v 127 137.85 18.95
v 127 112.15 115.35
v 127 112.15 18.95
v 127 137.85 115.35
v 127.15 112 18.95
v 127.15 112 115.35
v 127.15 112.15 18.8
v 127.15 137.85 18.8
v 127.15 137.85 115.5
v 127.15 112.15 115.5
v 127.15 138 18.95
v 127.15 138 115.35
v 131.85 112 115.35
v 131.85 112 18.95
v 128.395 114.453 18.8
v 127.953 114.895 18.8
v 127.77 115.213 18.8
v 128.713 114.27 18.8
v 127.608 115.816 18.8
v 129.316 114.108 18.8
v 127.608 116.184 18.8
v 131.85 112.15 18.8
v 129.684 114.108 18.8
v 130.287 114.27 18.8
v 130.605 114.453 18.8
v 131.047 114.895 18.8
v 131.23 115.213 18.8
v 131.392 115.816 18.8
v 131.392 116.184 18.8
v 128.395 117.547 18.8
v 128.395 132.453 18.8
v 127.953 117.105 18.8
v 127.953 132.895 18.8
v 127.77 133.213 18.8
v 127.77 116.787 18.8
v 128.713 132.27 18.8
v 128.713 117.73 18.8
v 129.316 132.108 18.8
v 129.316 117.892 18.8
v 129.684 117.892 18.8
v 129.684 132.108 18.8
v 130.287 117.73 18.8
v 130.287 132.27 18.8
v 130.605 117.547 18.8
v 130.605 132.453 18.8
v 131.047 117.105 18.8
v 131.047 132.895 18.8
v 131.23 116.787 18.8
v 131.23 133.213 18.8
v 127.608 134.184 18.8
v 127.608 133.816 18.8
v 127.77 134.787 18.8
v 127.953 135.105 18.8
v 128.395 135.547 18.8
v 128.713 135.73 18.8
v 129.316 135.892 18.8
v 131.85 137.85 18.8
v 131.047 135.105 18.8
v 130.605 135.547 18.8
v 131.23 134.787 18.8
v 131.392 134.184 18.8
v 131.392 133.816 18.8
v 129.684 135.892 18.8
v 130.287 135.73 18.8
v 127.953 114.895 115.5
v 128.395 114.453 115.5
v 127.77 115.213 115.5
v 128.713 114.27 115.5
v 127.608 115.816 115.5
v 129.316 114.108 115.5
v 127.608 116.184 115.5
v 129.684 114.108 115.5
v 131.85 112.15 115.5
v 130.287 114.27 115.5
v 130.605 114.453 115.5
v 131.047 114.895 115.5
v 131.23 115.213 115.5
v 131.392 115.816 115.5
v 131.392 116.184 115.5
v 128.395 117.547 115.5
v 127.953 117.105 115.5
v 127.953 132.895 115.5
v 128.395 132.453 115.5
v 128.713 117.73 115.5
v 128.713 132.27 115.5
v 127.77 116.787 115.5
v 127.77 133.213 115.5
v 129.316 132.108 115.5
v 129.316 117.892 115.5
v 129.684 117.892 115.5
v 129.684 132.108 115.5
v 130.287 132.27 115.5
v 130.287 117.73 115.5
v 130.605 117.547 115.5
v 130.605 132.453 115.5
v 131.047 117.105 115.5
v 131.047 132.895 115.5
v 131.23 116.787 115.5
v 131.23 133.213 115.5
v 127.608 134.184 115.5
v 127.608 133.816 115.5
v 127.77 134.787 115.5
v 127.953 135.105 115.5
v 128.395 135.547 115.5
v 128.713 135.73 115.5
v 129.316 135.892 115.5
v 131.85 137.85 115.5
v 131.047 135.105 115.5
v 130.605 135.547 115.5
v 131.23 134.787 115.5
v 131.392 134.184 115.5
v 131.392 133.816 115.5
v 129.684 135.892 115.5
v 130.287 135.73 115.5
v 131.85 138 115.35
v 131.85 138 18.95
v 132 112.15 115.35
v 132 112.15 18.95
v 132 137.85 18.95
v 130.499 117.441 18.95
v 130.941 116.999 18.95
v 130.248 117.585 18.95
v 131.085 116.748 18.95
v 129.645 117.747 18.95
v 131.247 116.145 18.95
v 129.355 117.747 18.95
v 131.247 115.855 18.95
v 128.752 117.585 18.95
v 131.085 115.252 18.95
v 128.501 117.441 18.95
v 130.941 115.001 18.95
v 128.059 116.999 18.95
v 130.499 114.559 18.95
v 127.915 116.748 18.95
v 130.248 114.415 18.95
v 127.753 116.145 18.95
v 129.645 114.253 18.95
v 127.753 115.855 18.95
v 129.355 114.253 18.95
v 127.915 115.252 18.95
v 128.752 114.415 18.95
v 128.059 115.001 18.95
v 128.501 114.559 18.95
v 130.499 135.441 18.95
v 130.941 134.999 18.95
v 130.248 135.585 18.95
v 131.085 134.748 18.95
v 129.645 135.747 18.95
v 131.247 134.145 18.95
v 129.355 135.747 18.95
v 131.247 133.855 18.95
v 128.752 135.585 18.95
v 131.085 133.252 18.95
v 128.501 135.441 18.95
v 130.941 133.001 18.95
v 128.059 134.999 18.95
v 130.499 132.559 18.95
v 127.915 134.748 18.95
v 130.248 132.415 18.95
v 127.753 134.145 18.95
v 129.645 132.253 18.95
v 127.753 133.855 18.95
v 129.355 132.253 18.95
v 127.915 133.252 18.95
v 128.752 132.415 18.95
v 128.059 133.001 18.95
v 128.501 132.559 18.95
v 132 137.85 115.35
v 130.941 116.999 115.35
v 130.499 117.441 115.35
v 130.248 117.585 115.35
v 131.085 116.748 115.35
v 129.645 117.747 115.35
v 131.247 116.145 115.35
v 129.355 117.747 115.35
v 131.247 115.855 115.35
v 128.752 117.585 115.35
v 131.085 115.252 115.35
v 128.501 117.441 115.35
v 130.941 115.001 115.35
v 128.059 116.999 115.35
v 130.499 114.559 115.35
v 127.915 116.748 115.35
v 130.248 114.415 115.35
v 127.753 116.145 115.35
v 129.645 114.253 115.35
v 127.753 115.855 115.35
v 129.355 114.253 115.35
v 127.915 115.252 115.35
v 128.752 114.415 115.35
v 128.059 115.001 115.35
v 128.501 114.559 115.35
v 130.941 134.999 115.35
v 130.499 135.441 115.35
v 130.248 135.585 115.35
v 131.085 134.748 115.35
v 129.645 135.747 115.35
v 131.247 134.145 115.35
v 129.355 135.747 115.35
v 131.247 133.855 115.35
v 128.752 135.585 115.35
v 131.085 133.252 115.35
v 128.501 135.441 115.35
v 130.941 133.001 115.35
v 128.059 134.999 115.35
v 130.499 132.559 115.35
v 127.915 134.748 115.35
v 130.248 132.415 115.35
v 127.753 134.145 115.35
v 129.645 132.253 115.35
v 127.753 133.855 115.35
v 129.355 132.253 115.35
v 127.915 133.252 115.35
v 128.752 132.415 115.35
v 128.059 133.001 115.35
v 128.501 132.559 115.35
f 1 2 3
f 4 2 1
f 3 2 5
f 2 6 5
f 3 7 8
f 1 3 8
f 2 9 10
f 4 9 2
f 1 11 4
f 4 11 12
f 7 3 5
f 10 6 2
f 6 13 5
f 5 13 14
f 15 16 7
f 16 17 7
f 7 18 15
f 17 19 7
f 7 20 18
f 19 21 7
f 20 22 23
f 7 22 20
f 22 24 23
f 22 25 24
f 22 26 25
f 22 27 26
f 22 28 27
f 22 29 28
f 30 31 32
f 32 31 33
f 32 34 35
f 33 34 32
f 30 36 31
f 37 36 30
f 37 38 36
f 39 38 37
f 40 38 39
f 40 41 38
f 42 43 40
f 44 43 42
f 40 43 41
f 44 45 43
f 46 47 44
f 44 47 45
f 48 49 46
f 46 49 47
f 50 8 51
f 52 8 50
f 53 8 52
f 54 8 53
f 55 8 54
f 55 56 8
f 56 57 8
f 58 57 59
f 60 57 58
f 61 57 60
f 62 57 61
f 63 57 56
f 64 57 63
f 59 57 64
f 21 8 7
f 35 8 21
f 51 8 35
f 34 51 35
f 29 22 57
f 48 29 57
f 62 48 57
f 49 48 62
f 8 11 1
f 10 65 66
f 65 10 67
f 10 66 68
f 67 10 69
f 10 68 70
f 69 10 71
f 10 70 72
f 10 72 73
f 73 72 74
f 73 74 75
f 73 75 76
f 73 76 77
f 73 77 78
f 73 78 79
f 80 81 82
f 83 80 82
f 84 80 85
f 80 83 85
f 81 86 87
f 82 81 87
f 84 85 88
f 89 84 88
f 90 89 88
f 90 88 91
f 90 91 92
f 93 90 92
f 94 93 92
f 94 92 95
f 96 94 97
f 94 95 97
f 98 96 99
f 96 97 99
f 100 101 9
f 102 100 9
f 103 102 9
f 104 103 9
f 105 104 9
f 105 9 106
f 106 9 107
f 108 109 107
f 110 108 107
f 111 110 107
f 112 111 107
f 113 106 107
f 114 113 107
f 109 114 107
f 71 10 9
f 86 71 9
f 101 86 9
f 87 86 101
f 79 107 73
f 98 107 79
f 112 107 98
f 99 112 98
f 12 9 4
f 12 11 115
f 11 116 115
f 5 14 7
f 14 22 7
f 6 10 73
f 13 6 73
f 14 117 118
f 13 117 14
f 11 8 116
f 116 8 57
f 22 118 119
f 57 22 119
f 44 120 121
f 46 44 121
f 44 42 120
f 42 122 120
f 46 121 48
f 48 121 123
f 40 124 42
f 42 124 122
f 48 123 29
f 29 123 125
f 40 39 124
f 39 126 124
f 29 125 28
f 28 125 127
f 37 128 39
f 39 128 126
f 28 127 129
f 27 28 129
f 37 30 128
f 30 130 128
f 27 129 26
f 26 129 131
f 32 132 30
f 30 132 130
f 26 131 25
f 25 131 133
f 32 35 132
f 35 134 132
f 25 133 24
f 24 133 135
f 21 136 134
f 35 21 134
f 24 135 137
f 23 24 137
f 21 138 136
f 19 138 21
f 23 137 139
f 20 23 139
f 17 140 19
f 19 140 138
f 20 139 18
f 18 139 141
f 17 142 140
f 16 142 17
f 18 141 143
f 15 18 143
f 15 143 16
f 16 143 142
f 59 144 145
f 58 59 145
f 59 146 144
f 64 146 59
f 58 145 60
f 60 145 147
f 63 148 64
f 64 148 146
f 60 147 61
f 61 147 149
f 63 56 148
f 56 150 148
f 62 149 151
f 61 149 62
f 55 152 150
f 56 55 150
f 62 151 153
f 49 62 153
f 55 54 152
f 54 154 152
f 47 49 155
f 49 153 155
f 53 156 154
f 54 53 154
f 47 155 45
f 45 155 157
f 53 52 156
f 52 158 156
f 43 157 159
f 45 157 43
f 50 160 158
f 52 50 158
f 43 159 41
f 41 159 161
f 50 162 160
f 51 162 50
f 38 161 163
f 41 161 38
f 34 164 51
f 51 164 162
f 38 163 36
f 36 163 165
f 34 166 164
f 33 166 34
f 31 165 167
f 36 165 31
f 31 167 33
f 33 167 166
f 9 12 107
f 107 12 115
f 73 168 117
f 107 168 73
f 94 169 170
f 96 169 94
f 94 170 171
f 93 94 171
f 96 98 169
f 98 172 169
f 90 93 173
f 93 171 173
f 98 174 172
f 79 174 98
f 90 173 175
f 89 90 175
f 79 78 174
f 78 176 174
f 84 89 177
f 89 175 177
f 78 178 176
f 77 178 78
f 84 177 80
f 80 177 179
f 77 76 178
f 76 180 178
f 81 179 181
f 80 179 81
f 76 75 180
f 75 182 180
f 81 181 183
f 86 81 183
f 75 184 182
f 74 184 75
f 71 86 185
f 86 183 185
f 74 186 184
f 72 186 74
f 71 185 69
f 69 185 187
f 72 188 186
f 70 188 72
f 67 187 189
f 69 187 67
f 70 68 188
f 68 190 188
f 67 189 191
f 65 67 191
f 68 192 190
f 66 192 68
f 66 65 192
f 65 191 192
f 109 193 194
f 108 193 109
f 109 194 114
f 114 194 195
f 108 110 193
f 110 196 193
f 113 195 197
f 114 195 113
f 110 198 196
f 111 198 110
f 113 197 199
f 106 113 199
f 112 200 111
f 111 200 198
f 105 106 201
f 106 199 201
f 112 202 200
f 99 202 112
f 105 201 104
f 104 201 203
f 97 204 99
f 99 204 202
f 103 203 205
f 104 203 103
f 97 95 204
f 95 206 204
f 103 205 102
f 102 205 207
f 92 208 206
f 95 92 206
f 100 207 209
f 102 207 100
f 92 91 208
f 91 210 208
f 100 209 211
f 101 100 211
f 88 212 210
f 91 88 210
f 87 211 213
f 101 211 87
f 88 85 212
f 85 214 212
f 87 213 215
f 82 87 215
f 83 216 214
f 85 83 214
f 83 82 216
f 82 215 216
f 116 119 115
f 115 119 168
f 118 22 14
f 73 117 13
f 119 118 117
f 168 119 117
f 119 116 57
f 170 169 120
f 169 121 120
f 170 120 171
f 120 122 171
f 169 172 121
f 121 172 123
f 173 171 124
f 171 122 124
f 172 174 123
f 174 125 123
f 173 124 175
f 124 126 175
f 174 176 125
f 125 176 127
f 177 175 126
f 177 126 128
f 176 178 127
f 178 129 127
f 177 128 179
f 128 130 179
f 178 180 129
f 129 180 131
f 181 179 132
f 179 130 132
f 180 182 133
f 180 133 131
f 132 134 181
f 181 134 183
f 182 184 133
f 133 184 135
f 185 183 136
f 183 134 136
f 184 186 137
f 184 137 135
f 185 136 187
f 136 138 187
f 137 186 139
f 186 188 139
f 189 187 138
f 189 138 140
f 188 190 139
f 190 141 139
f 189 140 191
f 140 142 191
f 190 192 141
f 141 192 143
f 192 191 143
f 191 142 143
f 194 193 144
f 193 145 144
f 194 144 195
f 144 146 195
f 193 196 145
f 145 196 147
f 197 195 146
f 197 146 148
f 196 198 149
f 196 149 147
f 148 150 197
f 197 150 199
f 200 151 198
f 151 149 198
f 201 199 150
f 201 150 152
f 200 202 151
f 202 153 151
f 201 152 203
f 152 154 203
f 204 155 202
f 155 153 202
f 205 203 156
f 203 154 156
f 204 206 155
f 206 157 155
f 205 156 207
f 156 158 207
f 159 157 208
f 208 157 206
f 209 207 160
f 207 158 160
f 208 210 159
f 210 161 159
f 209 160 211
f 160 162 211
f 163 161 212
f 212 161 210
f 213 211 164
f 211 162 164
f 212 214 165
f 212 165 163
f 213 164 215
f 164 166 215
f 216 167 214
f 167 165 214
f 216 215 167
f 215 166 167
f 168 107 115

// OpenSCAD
// Generated from the same CSG operations as STEP. Rebuild with spec/build_parent_hand_service.py.
polyhedron(points=[[127.0, 112.1500015258789, 18.950000762939453], [127.0, 112.1500015258789, 115.3499984741211], [127.0, 137.85000610351562, 18.950000762939453], [127.0, 137.85000610351562, 115.3499984741211], [127.1500015258789, 112.0, 18.950000762939453], [127.1500015258789, 112.0, 115.3499984741211], [127.1500015258789, 137.85000610351562, 18.799999237060547], [127.1500015258789, 112.1500015258789, 18.799999237060547], [127.1500015258789, 112.1500015258789, 115.5], [127.1500015258789, 137.85000610351562, 115.5], [127.1500015258789, 138.0, 18.950000762939453], [127.1500015258789, 138.0, 115.3499984741211], [131.85000610351562, 112.0, 115.3499984741211], [131.85000610351562, 112.0, 18.950000762939453], [127.95340728759766, 114.89494323730469, 18.799999237060547], [128.3949432373047, 114.45340728759766, 18.799999237060547], [127.76969909667969, 115.21314239501953, 18.799999237060547], [128.713134765625, 114.26969909667969, 18.799999237060547], [127.60808563232422, 115.81629180908203, 18.799999237060547], [129.3162841796875, 114.10808563232422, 18.799999237060547], [127.60808563232422, 116.18370819091797, 18.799999237060547], [129.6837158203125, 114.10808563232422, 18.799999237060547], [131.85000610351562, 112.1500015258789, 18.799999237060547], [130.286865234375, 114.26969909667969, 18.799999237060547], [130.6050567626953, 114.45340728759766, 18.799999237060547], [131.0465850830078, 114.89494323730469, 18.799999237060547], [131.2303009033203, 115.21314239501953, 18.799999237060547], [131.3919219970703, 115.81629180908203, 18.799999237060547], [131.3919219970703, 116.18370819091797, 18.799999237060547], [127.95340728759766, 117.10505676269531, 18.799999237060547], [128.3949432373047, 132.4534149169922, 18.799999237060547], [128.3949432373047, 117.54659271240234, 18.799999237060547], [127.95340728759766, 132.8949432373047, 18.799999237060547], [127.76969909667969, 116.78685760498047, 18.799999237060547], [127.76969909667969, 133.213134765625, 18.799999237060547], [128.713134765625, 132.2696990966797, 18.799999237060547], [128.713134765625, 117.73030090332031, 18.799999237060547], [129.3162841796875, 132.1080780029297, 18.799999237060547], [129.3162841796875, 117.89191436767578, 18.799999237060547], [129.6837158203125, 117.89191436767578, 18.799999237060547], [129.6837158203125, 132.1080780029297, 18.799999237060547], [130.286865234375, 132.2696990966797, 18.799999237060547], [130.286865234375, 117.73030090332031, 18.799999237060547], [130.6050567626953, 117.54659271240234, 18.799999237060547], [130.6050567626953, 132.4534149169922, 18.799999237060547], [131.0465850830078, 132.8949432373047, 18.799999237060547], [131.0465850830078, 117.10505676269531, 18.799999237060547], [131.2303009033203, 133.213134765625, 18.799999237060547], [131.2303009033203, 116.78685760498047, 18.799999237060547], [127.60808563232422, 133.8162841796875, 18.799999237060547], [127.60808563232422, 134.1837158203125, 18.799999237060547], [127.76969909667969, 134.786865234375, 18.799999237060547], [127.95340728759766, 135.1050567626953, 18.799999237060547], [128.3949432373047, 135.5465850830078, 18.799999237060547], [128.713134765625, 135.7303009033203, 18.799999237060547], [129.3162841796875, 135.8919219970703, 18.799999237060547], [131.85000610351562, 137.85000610351562, 18.799999237060547], [130.6050567626953, 135.5465850830078, 18.799999237060547], [131.0465850830078, 135.1050567626953, 18.799999237060547], [131.2303009033203, 134.786865234375, 18.799999237060547], [131.3919219970703, 134.1837158203125, 18.799999237060547], [131.3919219970703, 133.8162841796875, 18.799999237060547], [129.6837158203125, 135.8919219970703, 18.799999237060547], [130.286865234375, 135.7303009033203, 18.799999237060547], [128.3949432373047, 114.45340728759766, 115.5], [127.95340728759766, 114.89494323730469, 115.5], [127.76969909667969, 115.21314239501953, 115.5], [128.713134765625, 114.26969909667969, 115.5], [127.60808563232422, 115.81629180908203, 115.5], [129.3162841796875, 114.10808563232422, 115.5], [127.60808563232422, 116.18370819091797, 115.5], [129.6837158203125, 114.10808563232422, 115.5], [131.85000610351562, 112.1500015258789, 115.5], [130.286865234375, 114.26969909667969, 115.5], [130.6050567626953, 114.45340728759766, 115.5], [131.0465850830078, 114.89494323730469, 115.5], [131.2303009033203, 115.21314239501953, 115.5], [131.3919219970703, 115.81629180908203, 115.5], [131.3919219970703, 116.18370819091797, 115.5], [127.95340728759766, 132.8949432373047, 115.5], [127.95340728759766, 117.10505676269531, 115.5], [128.3949432373047, 117.54659271240234, 115.5], [128.3949432373047, 132.4534149169922, 115.5], [128.713134765625, 132.2696990966797, 115.5], [128.713134765625, 117.73030090332031, 115.5], [127.76969909667969, 133.213134765625, 115.5], [127.76969909667969, 116.78685760498047, 115.5], [129.3162841796875, 132.1080780029297, 115.5], [129.3162841796875, 117.89191436767578, 115.5], [129.6837158203125, 117.89191436767578, 115.5], [129.6837158203125, 132.1080780029297, 115.5], [130.286865234375, 132.2696990966797, 115.5], [130.286865234375, 117.73030090332031, 115.5], [130.6050567626953, 117.54659271240234, 115.5], [130.6050567626953, 132.4534149169922, 115.5], [131.0465850830078, 132.8949432373047, 115.5], [131.0465850830078, 117.10505676269531, 115.5], [131.2303009033203, 133.213134765625, 115.5], [131.2303009033203, 116.78685760498047, 115.5], [127.60808563232422, 133.8162841796875, 115.5], [127.60808563232422, 134.1837158203125, 115.5], [127.76969909667969, 134.786865234375, 115.5], [127.95340728759766, 135.1050567626953, 115.5], [128.3949432373047, 135.5465850830078, 115.5], [128.713134765625, 135.7303009033203, 115.5], [129.3162841796875, 135.8919219970703, 115.5], [131.85000610351562, 137.85000610351562, 115.5], [130.6050567626953, 135.5465850830078, 115.5], [131.0465850830078, 135.1050567626953, 115.5], [131.2303009033203, 134.786865234375, 115.5], [131.3919219970703, 134.1837158203125, 115.5], [131.3919219970703, 133.8162841796875, 115.5], [129.6837158203125, 135.8919219970703, 115.5], [130.286865234375, 135.7303009033203, 115.5], [131.85000610351562, 138.0, 115.3499984741211], [131.85000610351562, 138.0, 18.950000762939453], [132.0, 112.1500015258789, 18.950000762939453], [132.0, 112.1500015258789, 115.3499984741211], [132.0, 137.85000610351562, 18.950000762939453], [130.94052124023438, 116.99899291992188, 18.950000762939453], [130.49899291992188, 117.4405288696289, 18.950000762939453], [130.24803161621094, 117.58541870117188, 18.950000762939453], [131.08541870117188, 116.74803924560547, 18.950000762939453], [129.64488220214844, 117.74703216552734, 18.950000762939453], [131.2470245361328, 116.14488983154297, 18.950000762939453], [129.35511779785156, 117.74703216552734, 18.950000762939453], [131.2470245361328, 115.85511016845703, 18.950000762939453], [128.75196838378906, 117.58541870117188, 18.950000762939453], [131.08541870117188, 115.25196075439453, 18.950000762939453], [128.50100708007812, 117.4405288696289, 18.950000762939453], [130.94052124023438, 115.00100708007812, 18.950000762939453], [128.05947875976562, 116.99899291992188, 18.950000762939453], [130.49899291992188, 114.5594711303711, 18.950000762939453], [127.91458129882812, 116.74803924560547, 18.950000762939453], [130.24803161621094, 114.41458129882812, 18.950000762939453], [127.75296783447266, 116.14488983154297, 18.950000762939453], [129.64488220214844, 114.25296783447266, 18.950000762939453], [127.75296783447266, 115.85511016845703, 18.950000762939453], [129.35511779785156, 114.25296783447266, 18.950000762939453], [127.91458129882812, 115.25196075439453, 18.950000762939453], [128.75196838378906, 114.41458129882812, 18.950000762939453], [128.05947875976562, 115.00100708007812, 18.950000762939453], [128.50100708007812, 114.5594711303711, 18.950000762939453], [130.94052124023438, 134.99899291992188, 18.950000762939453], [130.49899291992188, 135.44052124023438, 18.950000762939453], [130.24803161621094, 135.58541870117188, 18.950000762939453], [131.08541870117188, 134.74803161621094, 18.950000762939453], [129.64488220214844, 135.7470245361328, 18.950000762939453], [131.2470245361328, 134.14488220214844, 18.950000762939453], [129.35511779785156, 135.7470245361328, 18.950000762939453], [131.2470245361328, 133.85511779785156, 18.950000762939453], [128.75196838378906, 135.58541870117188, 18.950000762939453], [131.08541870117188, 133.25196838378906, 18.950000762939453], [128.50100708007812, 135.44052124023438, 18.950000762939453], [130.94052124023438, 133.00100708007812, 18.950000762939453], [128.05947875976562, 134.99899291992188, 18.950000762939453], [130.49899291992188, 132.55947875976562, 18.950000762939453], [127.91458129882812, 134.74803161621094, 18.950000762939453], [130.24803161621094, 132.41458129882812, 18.950000762939453], [127.75296783447266, 134.14488220214844, 18.950000762939453], [129.64488220214844, 132.2529754638672, 18.950000762939453], [127.75296783447266, 133.85511779785156, 18.950000762939453], [129.35511779785156, 132.2529754638672, 18.950000762939453], [127.91458129882812, 133.25196838378906, 18.950000762939453], [128.75196838378906, 132.41458129882812, 18.950000762939453], [128.05947875976562, 133.00100708007812, 18.950000762939453], [128.50100708007812, 132.55947875976562, 18.950000762939453], [132.0, 137.85000610351562, 115.3499984741211], [130.49899291992188, 117.4405288696289, 115.3499984741211], [130.94052124023438, 116.99899291992188, 115.3499984741211], [130.24803161621094, 117.58541870117188, 115.3499984741211], [131.08541870117188, 116.74803924560547, 115.3499984741211], [129.64488220214844, 117.74703216552734, 115.3499984741211], [131.2470245361328, 116.14488983154297, 115.3499984741211], [129.35511779785156, 117.74703216552734, 115.3499984741211], [131.2470245361328, 115.85511016845703, 115.3499984741211], [128.75196838378906, 117.58541870117188, 115.3499984741211], [131.08541870117188, 115.25196075439453, 115.3499984741211], [128.50100708007812, 117.4405288696289, 115.3499984741211], [130.94052124023438, 115.00100708007812, 115.3499984741211], [128.05947875976562, 116.99899291992188, 115.3499984741211], [130.49899291992188, 114.5594711303711, 115.3499984741211], [127.91458129882812, 116.74803924560547, 115.3499984741211], [130.24803161621094, 114.41458129882812, 115.3499984741211], [127.75296783447266, 116.14488983154297, 115.3499984741211], [129.64488220214844, 114.25296783447266, 115.3499984741211], [127.75296783447266, 115.85511016845703, 115.3499984741211], [129.35511779785156, 114.25296783447266, 115.3499984741211], [127.91458129882812, 115.25196075439453, 115.3499984741211], [128.75196838378906, 114.41458129882812, 115.3499984741211], [128.05947875976562, 115.00100708007812, 115.3499984741211], [128.50100708007812, 114.5594711303711, 115.3499984741211], [130.49899291992188, 135.44052124023438, 115.3499984741211], [130.94052124023438, 134.99899291992188, 115.3499984741211], [130.24803161621094, 135.58541870117188, 115.3499984741211], [131.08541870117188, 134.74803161621094, 115.3499984741211], [129.64488220214844, 135.7470245361328, 115.3499984741211], [131.2470245361328, 134.14488220214844, 115.3499984741211], [129.35511779785156, 135.7470245361328, 115.3499984741211], [131.2470245361328, 133.85511779785156, 115.3499984741211], [128.75196838378906, 135.58541870117188, 115.3499984741211], [131.08541870117188, 133.25196838378906, 115.3499984741211], [128.50100708007812, 135.44052124023438, 115.3499984741211], [130.94052124023438, 133.00100708007812, 115.3499984741211], [128.05947875976562, 134.99899291992188, 115.3499984741211], [130.49899291992188, 132.55947875976562, 115.3499984741211], [127.91458129882812, 134.74803161621094, 115.3499984741211], [130.24803161621094, 132.41458129882812, 115.3499984741211], [127.75296783447266, 134.14488220214844, 115.3499984741211], [129.64488220214844, 132.2529754638672, 115.3499984741211], [127.75296783447266, 133.85511779785156, 115.3499984741211], [129.35511779785156, 132.2529754638672, 115.3499984741211], [127.91458129882812, 133.25196838378906, 115.3499984741211], [128.75196838378906, 132.41458129882812, 115.3499984741211], [128.05947875976562, 133.00100708007812, 115.3499984741211], [128.50100708007812, 132.55947875976562, 115.3499984741211]],faces=[[0, 1, 2], [2, 1, 3], [4, 1, 0], [4, 5, 1], [6, 7, 0], [6, 0, 2], [8, 9, 1], [1, 9, 3], [3, 10, 2], [11, 10, 3], [4, 0, 7], [1, 5, 8], [4, 12, 5], [13, 12, 4], [7, 14, 15], [7, 16, 14], [15, 17, 7], [7, 18, 16], [17, 19, 7], [7, 20, 18], [21, 22, 19], [19, 22, 7], [21, 23, 22], [23, 24, 22], [24, 25, 22], [25, 26, 22], [26, 27, 22], [27, 28, 22], [29, 30, 31], [32, 30, 29], [33, 34, 29], [29, 34, 32], [30, 35, 31], [31, 35, 36], [35, 37, 36], [36, 37, 38], [38, 37, 39], [37, 40, 39], [39, 41, 42], [42, 41, 43], [40, 41, 39], [41, 44, 43], [43, 45, 46], [44, 45, 43], [46, 47, 48], [45, 47, 46], [49, 6, 50], [50, 6, 51], [51, 6, 52], [52, 6, 53], [53, 6, 54], [6, 55, 54], [6, 56, 55], [57, 56, 58], [58, 56, 59], [59, 56, 60], [60, 56, 61], [55, 56, 62], [62, 56, 63], [63, 56, 57], [7, 6, 20], [20, 6, 33], [33, 6, 49], [33, 49, 34], [56, 22, 28], [56, 28, 48], [56, 48, 61], [61, 48, 47], [2, 10, 6], [64, 65, 8], [66, 8, 65], [67, 64, 8], [68, 8, 66], [69, 67, 8], [70, 8, 68], [71, 69, 8], [72, 71, 8], [73, 71, 72], [74, 73, 72], [75, 74, 72], [76, 75, 72], [77, 76, 72], [78, 77, 72], [79, 80, 81], [79, 81, 82], [83, 81, 84], [83, 82, 81], [85, 86, 80], [85, 80, 79], [87, 83, 84], [87, 84, 88], [87, 88, 89], [90, 87, 89], [91, 90, 89], [91, 89, 92], [91, 92, 93], [94, 91, 93], [95, 93, 96], [95, 94, 93], [97, 96, 98], [97, 95, 96], [9, 99, 100], [9, 100, 101], [9, 101, 102], [9, 102, 103], [9, 103, 104], [105, 9, 104], [106, 9, 105], [106, 107, 108], [106, 108, 109], [106, 109, 110], [106, 110, 111], [106, 105, 112], [106, 112, 113], [106, 113, 107], [9, 8, 70], [9, 70, 86], [9, 86, 99], [99, 86, 85], [72, 106, 78], [78, 106, 98], [98, 106, 111], [98, 111, 97], [3, 9, 11], [114, 10, 11], [114, 115, 10], [7, 13, 4], [7, 22, 13], [72, 8, 5], [72, 5, 12], [116, 117, 13], [13, 117, 12], [115, 6, 10], [56, 6, 115], [118, 116, 22], [118, 22, 56], [119, 120, 43], [119, 43, 46], [120, 42, 43], [120, 121, 42], [48, 119, 46], [122, 119, 48], [42, 123, 39], [121, 123, 42], [28, 122, 48], [124, 122, 28], [123, 38, 39], [123, 125, 38], [27, 124, 28], [126, 124, 27], [38, 127, 36], [125, 127, 38], [128, 126, 27], [128, 27, 26], [127, 31, 36], [127, 129, 31], [25, 128, 26], [130, 128, 25], [31, 131, 29], [129, 131, 31], [24, 130, 25], [132, 130, 24], [131, 33, 29], [131, 133, 33], [23, 132, 24], [134, 132, 23], [133, 135, 20], [133, 20, 33], [136, 134, 23], [136, 23, 21], [135, 137, 20], [20, 137, 18], [138, 136, 21], [138, 21, 19], [18, 139, 16], [137, 139, 18], [17, 138, 19], [140, 138, 17], [139, 141, 16], [16, 141, 14], [142, 140, 17], [142, 17, 15], [14, 142, 15], [141, 142, 14], [143, 144, 57], [143, 57, 58], [144, 145, 57], [57, 145, 63], [59, 143, 58], [146, 143, 59], [63, 147, 62], [145, 147, 63], [60, 146, 59], [148, 146, 60], [147, 55, 62], [147, 149, 55], [150, 148, 61], [61, 148, 60], [149, 151, 54], [149, 54, 55], [152, 150, 61], [152, 61, 47], [151, 53, 54], [151, 153, 53], [154, 47, 45], [154, 152, 47], [153, 155, 52], [153, 52, 53], [44, 154, 45], [156, 154, 44], [155, 51, 52], [155, 157, 51], [158, 156, 41], [41, 156, 44], [157, 159, 50], [157, 50, 51], [40, 158, 41], [160, 158, 40], [159, 161, 50], [50, 161, 49], [162, 160, 37], [37, 160, 40], [49, 163, 34], [161, 163, 49], [35, 162, 37], [164, 162, 35], [163, 165, 34], [34, 165, 32], [166, 164, 30], [30, 164, 35], [32, 166, 30], [165, 166, 32], [106, 11, 9], [114, 11, 106], [117, 167, 72], [72, 167, 106], [168, 169, 93], [93, 169, 96], [170, 168, 93], [170, 93, 92], [169, 98, 96], [169, 171, 98], [172, 92, 89], [172, 170, 92], [171, 173, 98], [98, 173, 78], [174, 172, 89], [174, 89, 88], [173, 77, 78], [173, 175, 77], [176, 88, 84], [176, 174, 88], [175, 177, 77], [77, 177, 76], [81, 176, 84], [178, 176, 81], [177, 75, 76], [177, 179, 75], [180, 178, 80], [80, 178, 81], [179, 74, 75], [179, 181, 74], [182, 180, 80], [182, 80, 86], [181, 183, 74], [74, 183, 73], [184, 86, 70], [184, 182, 86], [183, 185, 73], [73, 185, 71], [68, 184, 70], [186, 184, 68], [185, 187, 71], [71, 187, 69], [188, 186, 66], [66, 186, 68], [187, 67, 69], [187, 189, 67], [190, 188, 66], [190, 66, 65], [189, 191, 67], [67, 191, 64], [191, 65, 64], [191, 190, 65], [192, 193, 107], [107, 193, 108], [113, 192, 107], [194, 192, 113], [193, 109, 108], [193, 195, 109], [196, 194, 112], [112, 194, 113], [195, 197, 109], [109, 197, 110], [198, 196, 112], [198, 112, 105], [110, 199, 111], [197, 199, 110], [200, 105, 104], [200, 198, 105], [199, 201, 111], [111, 201, 97], [103, 200, 104], [202, 200, 103], [97, 203, 95], [201, 203, 97], [204, 202, 102], [102, 202, 103], [203, 94, 95], [203, 205, 94], [101, 204, 102], [206, 204, 101], [205, 207, 91], [205, 91, 94], [208, 206, 100], [100, 206, 101], [207, 90, 91], [207, 209, 90], [210, 208, 100], [210, 100, 99], [209, 211, 87], [209, 87, 90], [212, 210, 85], [85, 210, 99], [211, 83, 87], [211, 213, 83], [214, 212, 85], [214, 85, 79], [213, 215, 82], [213, 82, 83], [215, 79, 82], [215, 214, 79], [114, 118, 115], [167, 118, 114], [13, 22, 116], [12, 117, 72], [117, 116, 118], [117, 118, 167], [56, 115, 118], [120, 169, 168], [120, 119, 169], [170, 120, 168], [170, 121, 120], [119, 171, 169], [122, 171, 119], [123, 170, 172], [123, 121, 170], [122, 173, 171], [122, 124, 173], [174, 123, 172], [174, 125, 123], [124, 175, 173], [126, 175, 124], [125, 174, 176], [127, 125, 176], [126, 177, 175], [126, 128, 177], [178, 127, 176], [178, 129, 127], [128, 179, 177], [130, 179, 128], [131, 178, 180], [131, 129, 178], [132, 181, 179], [130, 132, 179], [180, 133, 131], [182, 133, 180], [132, 183, 181], [134, 183, 132], [135, 182, 184], [135, 133, 182], [136, 185, 183], [134, 136, 183], [186, 135, 184], [186, 137, 135], [138, 185, 136], [138, 187, 185], [137, 186, 188], [139, 137, 188], [138, 189, 187], [138, 140, 189], [190, 139, 188], [190, 141, 139], [140, 191, 189], [142, 191, 140], [142, 190, 191], [142, 141, 190], [144, 193, 192], [144, 143, 193], [194, 144, 192], [194, 145, 144], [143, 195, 193], [146, 195, 143], [145, 194, 196], [147, 145, 196], [148, 197, 195], [146, 148, 195], [196, 149, 147], [198, 149, 196], [197, 150, 199], [197, 148, 150], [149, 198, 200], [151, 149, 200], [150, 201, 199], [150, 152, 201], [202, 151, 200], [202, 153, 151], [201, 154, 203], [201, 152, 154], [155, 202, 204], [155, 153, 202], [154, 205, 203], [154, 156, 205], [206, 155, 204], [206, 157, 155], [207, 156, 158], [205, 156, 207], [159, 206, 208], [159, 157, 206], [158, 209, 207], [158, 160, 209], [210, 159, 208], [210, 161, 159], [211, 160, 162], [209, 160, 211], [163, 210, 212], [163, 161, 210], [164, 213, 211], [162, 164, 211], [214, 163, 212], [214, 165, 163], [213, 166, 215], [213, 164, 166], [166, 214, 215], [166, 165, 214], [114, 106, 167]],convexity=10);
